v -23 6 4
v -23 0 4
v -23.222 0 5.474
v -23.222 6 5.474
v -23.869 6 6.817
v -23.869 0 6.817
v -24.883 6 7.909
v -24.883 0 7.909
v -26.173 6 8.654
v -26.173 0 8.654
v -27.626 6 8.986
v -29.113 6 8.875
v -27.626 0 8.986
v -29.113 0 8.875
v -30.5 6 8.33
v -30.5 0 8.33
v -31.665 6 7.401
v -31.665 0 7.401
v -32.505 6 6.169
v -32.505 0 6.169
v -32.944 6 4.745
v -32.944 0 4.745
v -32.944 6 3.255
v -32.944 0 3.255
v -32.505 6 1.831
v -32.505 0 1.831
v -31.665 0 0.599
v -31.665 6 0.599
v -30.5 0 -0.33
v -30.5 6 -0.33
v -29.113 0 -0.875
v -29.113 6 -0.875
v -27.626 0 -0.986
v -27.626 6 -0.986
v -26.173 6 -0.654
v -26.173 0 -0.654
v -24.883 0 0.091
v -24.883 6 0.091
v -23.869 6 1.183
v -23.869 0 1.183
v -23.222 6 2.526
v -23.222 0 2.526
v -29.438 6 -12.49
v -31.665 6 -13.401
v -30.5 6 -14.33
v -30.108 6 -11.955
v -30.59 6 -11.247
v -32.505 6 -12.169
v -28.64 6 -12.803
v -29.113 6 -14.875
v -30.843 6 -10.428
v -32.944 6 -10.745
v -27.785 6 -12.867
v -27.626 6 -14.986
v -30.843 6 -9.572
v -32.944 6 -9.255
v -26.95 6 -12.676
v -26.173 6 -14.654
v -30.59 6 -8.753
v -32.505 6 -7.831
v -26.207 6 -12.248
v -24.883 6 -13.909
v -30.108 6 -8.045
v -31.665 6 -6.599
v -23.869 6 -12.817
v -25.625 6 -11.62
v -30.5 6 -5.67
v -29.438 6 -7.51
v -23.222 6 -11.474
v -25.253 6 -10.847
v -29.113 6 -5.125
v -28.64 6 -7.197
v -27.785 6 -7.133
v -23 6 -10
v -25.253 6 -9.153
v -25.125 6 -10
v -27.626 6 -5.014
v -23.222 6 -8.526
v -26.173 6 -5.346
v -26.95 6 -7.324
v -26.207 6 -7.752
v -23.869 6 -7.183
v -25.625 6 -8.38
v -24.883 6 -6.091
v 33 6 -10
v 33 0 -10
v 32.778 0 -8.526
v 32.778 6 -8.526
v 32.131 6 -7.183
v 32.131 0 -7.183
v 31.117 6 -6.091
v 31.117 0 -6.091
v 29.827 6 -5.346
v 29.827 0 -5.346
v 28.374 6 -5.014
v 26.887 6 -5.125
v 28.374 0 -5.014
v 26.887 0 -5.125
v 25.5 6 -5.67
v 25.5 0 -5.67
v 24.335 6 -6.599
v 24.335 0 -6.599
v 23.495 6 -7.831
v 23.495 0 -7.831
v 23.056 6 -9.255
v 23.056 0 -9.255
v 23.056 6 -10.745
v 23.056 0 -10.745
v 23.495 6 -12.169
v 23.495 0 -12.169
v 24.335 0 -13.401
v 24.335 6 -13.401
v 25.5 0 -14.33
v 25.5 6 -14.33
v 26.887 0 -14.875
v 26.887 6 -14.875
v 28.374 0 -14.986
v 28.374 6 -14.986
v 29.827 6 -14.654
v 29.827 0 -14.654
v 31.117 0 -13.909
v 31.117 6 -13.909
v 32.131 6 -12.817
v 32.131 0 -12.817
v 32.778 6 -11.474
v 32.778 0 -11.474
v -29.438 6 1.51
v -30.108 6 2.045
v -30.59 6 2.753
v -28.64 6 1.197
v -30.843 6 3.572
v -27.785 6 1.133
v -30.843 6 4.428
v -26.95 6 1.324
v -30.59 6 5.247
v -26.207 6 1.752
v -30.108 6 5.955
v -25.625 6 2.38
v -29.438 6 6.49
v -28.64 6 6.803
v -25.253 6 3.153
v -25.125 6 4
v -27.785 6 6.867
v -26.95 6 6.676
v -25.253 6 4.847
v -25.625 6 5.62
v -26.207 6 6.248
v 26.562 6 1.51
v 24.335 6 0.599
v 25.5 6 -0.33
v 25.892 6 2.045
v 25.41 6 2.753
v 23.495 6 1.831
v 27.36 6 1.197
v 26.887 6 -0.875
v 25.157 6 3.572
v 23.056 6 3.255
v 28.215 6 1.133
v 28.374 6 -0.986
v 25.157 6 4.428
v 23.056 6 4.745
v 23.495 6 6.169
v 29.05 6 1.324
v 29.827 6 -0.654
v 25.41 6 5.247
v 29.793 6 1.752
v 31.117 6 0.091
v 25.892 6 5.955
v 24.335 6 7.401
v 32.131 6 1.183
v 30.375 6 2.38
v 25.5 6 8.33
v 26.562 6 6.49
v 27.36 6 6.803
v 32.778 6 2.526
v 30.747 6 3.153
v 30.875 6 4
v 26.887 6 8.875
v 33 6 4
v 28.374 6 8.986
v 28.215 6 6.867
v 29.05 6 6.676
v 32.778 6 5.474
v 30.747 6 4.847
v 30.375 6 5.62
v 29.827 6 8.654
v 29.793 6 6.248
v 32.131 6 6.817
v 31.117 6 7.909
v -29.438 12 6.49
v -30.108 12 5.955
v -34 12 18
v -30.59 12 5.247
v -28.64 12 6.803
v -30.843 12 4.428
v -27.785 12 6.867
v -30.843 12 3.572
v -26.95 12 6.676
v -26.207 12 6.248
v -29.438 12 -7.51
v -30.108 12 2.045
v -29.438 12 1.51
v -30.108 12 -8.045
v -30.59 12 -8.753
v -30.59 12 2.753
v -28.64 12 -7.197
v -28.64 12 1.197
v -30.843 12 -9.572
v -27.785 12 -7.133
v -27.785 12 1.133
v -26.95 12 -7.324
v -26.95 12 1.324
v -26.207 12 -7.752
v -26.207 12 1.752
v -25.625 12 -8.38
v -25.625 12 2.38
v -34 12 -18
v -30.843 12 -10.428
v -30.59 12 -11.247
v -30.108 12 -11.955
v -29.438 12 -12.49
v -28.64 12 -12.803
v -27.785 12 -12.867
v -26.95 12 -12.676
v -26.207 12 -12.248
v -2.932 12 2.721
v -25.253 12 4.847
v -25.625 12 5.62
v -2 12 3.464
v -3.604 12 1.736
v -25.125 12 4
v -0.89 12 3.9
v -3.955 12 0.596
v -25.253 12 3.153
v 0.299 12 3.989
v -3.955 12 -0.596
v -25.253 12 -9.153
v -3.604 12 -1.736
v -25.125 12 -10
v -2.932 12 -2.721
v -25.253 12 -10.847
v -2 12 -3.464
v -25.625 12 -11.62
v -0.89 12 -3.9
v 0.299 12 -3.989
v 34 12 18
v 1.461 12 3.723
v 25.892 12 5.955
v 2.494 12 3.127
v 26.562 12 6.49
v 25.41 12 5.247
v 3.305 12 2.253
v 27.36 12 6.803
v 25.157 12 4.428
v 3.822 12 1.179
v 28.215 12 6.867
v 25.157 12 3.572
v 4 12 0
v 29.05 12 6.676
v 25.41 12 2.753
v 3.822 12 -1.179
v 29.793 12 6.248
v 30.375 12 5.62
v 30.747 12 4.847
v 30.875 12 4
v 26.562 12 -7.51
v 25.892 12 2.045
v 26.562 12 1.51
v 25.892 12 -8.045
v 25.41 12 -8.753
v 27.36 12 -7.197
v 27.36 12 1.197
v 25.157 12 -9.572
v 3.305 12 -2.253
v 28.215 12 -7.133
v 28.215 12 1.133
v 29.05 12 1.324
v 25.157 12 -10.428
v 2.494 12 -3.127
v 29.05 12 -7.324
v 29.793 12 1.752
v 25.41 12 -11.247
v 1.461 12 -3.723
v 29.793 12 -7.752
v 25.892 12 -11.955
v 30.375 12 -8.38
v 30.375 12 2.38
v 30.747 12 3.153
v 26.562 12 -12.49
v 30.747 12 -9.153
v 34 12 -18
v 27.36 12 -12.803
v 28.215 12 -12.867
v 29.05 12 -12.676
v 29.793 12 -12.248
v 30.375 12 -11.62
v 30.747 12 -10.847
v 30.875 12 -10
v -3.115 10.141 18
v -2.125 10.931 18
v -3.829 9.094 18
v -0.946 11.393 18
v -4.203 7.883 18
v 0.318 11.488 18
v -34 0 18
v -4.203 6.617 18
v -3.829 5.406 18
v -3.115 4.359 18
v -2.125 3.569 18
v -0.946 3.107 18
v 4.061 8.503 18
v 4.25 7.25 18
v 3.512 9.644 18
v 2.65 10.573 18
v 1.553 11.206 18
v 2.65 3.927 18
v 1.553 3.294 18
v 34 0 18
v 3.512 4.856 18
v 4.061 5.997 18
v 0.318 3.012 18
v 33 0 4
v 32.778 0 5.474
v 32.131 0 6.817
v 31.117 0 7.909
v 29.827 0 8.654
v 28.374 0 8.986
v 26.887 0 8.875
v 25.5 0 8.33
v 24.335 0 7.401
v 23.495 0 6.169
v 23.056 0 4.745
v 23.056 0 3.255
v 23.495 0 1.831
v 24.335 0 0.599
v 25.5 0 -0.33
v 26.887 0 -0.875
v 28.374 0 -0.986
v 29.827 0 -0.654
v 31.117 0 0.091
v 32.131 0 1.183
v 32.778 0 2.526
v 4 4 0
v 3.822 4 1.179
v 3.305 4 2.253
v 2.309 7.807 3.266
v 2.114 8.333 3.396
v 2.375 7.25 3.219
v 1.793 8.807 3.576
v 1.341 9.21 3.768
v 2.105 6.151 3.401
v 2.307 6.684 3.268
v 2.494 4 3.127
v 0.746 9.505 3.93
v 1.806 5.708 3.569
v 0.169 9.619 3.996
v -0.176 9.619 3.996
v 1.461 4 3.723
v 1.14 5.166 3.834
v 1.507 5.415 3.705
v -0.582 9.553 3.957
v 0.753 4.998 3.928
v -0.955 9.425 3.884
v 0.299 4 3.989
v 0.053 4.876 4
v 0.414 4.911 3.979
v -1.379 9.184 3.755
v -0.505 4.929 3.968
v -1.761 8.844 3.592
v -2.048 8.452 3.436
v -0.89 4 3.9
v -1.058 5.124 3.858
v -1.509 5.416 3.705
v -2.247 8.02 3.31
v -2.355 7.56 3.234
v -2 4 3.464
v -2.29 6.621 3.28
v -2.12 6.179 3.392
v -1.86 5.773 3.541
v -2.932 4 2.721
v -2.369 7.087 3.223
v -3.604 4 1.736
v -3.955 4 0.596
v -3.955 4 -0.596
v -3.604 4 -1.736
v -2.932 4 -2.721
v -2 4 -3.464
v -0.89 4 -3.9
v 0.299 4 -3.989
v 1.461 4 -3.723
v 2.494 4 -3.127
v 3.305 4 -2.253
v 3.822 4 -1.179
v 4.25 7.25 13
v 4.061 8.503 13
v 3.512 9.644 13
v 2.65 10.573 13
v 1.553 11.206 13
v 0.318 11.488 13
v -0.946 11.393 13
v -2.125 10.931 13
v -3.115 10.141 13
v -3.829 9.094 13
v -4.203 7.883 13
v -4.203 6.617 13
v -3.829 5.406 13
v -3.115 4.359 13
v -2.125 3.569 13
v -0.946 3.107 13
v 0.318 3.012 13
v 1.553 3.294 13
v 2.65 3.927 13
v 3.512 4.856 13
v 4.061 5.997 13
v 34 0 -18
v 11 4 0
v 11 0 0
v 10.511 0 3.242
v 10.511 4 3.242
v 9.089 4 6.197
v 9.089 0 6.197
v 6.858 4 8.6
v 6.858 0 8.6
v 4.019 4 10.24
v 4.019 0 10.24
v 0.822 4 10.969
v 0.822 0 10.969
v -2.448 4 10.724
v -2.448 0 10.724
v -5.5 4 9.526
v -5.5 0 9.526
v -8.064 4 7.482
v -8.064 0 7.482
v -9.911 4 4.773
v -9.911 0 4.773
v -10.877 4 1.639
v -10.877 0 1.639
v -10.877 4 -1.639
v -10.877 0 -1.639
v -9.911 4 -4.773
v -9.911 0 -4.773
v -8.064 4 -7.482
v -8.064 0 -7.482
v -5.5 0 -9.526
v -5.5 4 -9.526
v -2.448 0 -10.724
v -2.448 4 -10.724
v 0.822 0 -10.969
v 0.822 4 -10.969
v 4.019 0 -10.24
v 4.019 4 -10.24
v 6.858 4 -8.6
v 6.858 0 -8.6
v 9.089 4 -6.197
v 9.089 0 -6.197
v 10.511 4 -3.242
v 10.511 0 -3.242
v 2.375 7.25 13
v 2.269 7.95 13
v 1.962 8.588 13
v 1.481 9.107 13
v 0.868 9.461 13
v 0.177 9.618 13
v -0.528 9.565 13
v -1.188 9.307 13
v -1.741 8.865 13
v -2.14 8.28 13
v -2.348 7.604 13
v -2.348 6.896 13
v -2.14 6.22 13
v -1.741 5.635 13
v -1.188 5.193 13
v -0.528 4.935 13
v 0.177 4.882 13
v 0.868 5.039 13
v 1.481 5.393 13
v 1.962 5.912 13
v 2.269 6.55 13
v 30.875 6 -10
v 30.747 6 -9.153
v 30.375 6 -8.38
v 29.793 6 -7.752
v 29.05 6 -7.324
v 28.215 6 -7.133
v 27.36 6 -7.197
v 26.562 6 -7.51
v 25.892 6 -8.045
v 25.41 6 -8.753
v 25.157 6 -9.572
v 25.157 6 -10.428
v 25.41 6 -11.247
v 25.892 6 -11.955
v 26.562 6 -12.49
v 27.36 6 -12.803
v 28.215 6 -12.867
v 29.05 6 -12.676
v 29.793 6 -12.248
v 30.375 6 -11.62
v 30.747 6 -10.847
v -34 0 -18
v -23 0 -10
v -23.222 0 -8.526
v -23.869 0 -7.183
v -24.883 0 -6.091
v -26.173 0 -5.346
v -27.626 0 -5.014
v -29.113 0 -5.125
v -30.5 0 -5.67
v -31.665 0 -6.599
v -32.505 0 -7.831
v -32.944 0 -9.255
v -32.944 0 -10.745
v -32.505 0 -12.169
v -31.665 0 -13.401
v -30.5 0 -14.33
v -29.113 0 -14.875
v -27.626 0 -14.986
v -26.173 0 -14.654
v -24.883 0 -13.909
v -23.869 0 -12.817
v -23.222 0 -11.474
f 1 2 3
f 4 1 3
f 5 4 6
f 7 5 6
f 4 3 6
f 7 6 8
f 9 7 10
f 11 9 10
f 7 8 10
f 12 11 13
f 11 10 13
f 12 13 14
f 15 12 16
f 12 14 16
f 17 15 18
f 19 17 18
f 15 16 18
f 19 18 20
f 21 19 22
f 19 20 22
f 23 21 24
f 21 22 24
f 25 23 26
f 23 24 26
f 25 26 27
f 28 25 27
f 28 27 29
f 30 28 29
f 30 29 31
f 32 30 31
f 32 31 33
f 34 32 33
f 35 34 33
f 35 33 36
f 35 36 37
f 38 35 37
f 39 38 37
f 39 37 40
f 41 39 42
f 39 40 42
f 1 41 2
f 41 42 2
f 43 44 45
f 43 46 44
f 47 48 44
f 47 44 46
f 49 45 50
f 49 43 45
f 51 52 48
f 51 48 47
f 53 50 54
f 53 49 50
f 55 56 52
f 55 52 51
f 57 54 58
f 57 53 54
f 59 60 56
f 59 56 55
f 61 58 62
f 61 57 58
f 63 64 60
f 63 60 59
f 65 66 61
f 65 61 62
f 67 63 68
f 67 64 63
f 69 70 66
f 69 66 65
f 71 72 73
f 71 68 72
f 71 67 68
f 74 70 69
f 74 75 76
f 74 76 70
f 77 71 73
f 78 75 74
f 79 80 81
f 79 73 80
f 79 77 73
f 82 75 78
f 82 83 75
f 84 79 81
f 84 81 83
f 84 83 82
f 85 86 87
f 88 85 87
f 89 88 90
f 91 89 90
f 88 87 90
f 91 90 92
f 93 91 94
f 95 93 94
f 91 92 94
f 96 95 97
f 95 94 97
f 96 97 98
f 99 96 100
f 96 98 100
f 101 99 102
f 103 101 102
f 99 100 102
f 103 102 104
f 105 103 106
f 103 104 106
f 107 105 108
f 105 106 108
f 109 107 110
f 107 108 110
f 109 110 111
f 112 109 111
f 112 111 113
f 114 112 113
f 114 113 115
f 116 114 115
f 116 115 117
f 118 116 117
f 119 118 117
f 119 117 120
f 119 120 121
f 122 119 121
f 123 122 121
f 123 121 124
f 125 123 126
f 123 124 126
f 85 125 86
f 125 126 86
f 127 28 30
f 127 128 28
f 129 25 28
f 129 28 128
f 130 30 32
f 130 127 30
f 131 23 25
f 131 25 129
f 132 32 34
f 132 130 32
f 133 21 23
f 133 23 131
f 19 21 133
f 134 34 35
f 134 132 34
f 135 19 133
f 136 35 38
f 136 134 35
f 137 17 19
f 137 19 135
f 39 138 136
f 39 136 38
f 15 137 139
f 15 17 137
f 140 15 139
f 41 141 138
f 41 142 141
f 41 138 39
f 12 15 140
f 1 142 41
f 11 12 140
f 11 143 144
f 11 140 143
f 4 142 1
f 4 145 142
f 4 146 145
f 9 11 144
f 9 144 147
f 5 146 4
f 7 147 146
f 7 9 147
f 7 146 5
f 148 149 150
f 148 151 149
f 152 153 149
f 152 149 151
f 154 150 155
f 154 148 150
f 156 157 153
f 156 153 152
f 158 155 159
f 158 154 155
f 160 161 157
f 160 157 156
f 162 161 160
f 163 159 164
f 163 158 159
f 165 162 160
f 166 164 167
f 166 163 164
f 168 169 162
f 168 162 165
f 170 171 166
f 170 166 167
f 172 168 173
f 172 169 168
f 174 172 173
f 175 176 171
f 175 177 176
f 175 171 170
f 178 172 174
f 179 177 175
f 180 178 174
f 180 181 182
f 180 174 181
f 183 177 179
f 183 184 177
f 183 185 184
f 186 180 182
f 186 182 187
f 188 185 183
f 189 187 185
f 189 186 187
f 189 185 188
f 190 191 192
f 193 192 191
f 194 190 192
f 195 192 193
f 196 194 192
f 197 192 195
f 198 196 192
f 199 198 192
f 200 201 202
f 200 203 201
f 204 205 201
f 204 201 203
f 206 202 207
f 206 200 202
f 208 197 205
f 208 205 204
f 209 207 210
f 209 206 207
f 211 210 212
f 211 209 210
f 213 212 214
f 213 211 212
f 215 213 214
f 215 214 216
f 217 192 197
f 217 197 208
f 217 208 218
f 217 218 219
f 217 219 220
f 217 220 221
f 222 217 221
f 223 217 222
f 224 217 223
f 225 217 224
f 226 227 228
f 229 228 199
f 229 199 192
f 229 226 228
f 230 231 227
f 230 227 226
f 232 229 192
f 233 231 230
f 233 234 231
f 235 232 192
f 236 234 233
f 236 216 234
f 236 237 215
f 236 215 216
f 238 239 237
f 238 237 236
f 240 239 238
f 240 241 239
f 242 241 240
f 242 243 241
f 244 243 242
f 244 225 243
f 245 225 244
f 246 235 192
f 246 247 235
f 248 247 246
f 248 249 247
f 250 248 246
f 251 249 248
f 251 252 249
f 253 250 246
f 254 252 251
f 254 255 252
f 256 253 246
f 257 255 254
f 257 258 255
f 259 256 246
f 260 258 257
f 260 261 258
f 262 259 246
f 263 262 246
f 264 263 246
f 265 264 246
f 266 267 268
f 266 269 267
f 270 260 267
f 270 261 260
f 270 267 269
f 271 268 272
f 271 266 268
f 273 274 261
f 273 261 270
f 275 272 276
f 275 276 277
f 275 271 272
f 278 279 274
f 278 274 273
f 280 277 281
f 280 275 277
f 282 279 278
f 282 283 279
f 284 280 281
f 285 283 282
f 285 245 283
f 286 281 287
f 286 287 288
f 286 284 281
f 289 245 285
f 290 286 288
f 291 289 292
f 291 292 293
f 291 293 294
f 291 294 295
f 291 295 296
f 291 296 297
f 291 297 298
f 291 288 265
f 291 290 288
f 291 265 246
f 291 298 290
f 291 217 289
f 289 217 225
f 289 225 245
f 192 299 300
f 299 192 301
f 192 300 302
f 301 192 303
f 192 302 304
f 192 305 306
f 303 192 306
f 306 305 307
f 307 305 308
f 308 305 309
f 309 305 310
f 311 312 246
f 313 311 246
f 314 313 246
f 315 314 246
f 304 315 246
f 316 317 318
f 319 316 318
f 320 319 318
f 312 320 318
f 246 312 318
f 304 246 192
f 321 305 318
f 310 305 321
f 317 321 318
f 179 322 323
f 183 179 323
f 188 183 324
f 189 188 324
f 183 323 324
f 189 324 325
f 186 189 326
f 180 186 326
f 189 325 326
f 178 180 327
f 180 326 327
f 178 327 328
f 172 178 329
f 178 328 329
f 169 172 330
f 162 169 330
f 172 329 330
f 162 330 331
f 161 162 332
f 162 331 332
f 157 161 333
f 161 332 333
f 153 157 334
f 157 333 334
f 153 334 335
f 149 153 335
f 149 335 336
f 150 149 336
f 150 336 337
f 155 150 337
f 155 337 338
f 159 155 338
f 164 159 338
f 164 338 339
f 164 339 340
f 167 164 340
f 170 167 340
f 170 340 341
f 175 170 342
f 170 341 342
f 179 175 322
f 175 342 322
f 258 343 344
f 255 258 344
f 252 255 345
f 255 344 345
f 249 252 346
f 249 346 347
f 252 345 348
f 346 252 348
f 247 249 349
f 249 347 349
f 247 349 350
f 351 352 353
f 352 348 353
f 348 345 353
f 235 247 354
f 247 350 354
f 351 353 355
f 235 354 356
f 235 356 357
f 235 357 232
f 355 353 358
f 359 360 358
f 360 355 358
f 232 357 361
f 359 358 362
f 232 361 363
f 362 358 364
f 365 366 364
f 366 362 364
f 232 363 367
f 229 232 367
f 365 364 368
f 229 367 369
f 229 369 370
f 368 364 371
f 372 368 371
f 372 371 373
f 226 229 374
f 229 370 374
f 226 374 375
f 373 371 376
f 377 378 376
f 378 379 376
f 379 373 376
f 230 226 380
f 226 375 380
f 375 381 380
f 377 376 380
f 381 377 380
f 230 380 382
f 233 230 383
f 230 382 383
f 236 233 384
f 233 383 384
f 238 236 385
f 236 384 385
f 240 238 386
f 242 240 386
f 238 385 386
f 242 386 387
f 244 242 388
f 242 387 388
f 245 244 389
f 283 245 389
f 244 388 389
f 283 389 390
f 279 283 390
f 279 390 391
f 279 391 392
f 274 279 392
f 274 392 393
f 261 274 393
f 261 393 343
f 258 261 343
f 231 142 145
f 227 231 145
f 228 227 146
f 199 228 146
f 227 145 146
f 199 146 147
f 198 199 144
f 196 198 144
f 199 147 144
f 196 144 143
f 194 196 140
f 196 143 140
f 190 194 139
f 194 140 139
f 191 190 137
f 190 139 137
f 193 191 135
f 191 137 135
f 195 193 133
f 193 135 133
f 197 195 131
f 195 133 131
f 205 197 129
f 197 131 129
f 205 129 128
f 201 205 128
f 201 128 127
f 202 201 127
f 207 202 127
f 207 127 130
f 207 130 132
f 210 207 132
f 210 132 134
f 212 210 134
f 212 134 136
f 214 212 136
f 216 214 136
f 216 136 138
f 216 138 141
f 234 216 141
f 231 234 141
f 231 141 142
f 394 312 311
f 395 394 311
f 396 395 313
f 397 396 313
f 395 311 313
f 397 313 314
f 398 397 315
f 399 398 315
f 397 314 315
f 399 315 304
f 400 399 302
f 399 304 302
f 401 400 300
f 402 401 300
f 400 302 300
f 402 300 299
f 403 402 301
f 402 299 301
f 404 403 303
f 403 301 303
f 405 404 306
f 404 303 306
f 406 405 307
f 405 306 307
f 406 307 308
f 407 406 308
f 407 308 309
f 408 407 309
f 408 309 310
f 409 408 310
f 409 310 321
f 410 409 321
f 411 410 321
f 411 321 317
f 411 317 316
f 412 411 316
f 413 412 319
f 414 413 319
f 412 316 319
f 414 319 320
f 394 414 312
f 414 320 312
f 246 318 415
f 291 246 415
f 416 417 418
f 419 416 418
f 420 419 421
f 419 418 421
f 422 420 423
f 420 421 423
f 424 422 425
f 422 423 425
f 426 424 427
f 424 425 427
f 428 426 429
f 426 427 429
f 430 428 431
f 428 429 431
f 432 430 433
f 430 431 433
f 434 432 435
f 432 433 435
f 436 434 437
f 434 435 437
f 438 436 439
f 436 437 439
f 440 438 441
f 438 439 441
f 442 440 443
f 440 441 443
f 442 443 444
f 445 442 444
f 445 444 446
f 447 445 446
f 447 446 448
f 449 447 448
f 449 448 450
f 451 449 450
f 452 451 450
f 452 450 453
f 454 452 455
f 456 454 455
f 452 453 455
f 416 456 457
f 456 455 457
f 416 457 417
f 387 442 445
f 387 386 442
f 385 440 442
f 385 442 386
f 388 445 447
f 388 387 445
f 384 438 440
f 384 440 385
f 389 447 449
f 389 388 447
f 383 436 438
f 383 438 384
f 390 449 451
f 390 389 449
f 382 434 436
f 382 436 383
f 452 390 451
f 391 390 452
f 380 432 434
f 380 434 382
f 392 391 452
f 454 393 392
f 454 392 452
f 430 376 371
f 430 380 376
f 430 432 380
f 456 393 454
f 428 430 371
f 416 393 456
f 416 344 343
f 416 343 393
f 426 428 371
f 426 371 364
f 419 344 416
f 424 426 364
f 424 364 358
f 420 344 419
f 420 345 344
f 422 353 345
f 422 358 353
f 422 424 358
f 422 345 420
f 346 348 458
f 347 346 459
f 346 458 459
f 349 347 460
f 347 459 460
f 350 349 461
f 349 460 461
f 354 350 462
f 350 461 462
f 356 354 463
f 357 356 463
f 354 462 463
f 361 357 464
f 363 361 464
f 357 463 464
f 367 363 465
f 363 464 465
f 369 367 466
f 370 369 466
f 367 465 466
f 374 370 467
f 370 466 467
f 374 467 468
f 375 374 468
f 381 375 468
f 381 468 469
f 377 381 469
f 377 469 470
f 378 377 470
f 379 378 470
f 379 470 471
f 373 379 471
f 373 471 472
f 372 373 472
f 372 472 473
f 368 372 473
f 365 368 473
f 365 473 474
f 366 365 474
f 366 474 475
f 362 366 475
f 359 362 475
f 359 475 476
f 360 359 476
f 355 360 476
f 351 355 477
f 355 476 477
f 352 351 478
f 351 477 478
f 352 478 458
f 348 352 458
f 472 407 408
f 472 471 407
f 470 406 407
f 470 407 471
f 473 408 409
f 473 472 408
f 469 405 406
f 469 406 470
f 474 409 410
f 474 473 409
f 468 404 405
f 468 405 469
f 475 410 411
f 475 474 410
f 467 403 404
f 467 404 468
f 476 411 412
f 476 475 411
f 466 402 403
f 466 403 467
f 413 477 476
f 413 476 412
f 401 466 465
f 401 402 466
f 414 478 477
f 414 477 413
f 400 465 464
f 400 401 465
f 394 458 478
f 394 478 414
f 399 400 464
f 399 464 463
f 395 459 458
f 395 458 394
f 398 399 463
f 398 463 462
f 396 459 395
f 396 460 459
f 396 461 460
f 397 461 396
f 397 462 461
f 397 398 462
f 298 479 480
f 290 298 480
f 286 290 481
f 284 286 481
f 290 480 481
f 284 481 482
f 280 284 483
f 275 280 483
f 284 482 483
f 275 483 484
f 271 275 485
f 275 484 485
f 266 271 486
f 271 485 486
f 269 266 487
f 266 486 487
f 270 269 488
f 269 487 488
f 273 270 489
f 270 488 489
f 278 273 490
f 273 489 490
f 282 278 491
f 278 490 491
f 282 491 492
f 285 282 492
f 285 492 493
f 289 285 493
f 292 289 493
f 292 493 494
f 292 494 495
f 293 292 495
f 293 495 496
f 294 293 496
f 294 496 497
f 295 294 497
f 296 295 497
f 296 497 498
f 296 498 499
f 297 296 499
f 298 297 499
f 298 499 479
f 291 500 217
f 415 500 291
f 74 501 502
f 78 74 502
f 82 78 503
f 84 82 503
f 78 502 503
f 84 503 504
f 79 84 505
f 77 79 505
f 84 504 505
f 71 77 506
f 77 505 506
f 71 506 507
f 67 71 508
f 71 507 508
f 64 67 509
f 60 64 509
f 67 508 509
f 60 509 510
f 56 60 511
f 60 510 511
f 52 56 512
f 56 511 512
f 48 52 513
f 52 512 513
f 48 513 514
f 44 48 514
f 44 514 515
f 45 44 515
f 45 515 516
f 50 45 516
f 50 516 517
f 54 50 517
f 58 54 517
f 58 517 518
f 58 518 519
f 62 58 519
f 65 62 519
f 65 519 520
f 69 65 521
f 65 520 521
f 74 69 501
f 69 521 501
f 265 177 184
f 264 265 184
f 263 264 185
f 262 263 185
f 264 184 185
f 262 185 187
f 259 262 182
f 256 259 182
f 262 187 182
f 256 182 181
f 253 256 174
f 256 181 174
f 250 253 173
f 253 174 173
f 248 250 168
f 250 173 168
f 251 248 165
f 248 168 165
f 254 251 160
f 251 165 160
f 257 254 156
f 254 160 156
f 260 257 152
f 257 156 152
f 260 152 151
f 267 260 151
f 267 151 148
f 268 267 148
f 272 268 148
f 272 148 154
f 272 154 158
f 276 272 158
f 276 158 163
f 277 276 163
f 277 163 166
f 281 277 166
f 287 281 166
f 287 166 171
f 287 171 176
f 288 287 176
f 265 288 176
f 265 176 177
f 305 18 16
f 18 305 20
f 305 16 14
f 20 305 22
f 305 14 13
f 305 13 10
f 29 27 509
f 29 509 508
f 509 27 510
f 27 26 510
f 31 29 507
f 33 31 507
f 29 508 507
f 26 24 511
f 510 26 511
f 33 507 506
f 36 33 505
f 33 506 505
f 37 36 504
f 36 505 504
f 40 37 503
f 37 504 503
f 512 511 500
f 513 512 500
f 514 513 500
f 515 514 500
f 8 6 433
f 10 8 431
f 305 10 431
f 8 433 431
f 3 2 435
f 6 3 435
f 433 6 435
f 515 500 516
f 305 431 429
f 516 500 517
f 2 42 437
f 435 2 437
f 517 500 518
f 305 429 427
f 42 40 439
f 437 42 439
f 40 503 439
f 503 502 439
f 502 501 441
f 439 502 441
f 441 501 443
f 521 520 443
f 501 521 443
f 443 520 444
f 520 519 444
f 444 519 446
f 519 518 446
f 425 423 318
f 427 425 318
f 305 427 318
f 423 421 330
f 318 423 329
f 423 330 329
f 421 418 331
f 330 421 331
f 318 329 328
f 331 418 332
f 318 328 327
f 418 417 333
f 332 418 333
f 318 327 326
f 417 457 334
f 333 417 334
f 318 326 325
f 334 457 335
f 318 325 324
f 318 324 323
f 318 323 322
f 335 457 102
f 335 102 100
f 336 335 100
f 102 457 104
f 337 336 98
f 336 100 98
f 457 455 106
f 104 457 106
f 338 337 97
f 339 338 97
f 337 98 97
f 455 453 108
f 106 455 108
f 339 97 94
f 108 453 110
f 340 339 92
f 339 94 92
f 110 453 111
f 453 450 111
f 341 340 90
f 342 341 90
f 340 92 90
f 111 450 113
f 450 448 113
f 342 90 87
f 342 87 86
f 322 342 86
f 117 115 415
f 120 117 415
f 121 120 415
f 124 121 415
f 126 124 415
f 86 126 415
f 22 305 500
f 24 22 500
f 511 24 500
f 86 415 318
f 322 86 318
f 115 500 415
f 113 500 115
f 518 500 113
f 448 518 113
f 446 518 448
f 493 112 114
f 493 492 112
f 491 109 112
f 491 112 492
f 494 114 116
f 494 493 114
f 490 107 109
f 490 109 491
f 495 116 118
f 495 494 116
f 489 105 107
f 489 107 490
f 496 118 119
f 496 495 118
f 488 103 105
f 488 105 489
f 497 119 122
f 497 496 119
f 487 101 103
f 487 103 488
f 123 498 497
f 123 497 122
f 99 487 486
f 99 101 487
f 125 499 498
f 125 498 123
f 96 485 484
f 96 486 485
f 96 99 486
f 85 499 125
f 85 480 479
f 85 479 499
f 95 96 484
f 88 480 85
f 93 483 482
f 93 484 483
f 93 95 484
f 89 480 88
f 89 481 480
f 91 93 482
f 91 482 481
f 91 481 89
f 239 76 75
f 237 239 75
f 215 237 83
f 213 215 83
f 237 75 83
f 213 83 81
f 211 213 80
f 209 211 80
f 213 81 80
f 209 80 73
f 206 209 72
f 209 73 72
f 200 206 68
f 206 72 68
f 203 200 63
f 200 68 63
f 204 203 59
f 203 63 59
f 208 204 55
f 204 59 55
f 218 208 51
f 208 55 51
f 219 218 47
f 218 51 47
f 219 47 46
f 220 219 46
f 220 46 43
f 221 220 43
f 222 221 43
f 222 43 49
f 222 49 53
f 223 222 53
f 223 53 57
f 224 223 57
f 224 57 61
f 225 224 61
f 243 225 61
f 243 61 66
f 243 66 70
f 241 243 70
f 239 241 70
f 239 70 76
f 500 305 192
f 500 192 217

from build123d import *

# Parameters (mm, degrees)
SKETCH1_W           = 68
SKETCH1_H           = 36
BOSS_EXTRUDE1_DEPTH = 12
SKETCH2_R           = 11
CUT_EXTRUDE1_DEPTH  = 4
SKETCH3_R           = 4
CUT_EXTRUDE2_DEPTH  = 9
CUT_EXTRUDE3_REACH  = 38
SKETCH4_R           = 2.375
CUT_EXTRUDE4_REACH  = 14
SKETCH5_R           = 2.875
SKETCH6_R           = 5
CUT_EXTRUDE5_DEPTH  = 6
SKETCH7_R           = 4.25
CUT_EXTRUDE6_DEPTH  = 5


with BuildPart() as part:
    # Sketch1 → Boss-Extrude1 (new body)
    with BuildSketch(Plane(origin=(0, 0, 0), x_dir=(1, 0, 0), z_dir=(0, 1, 0))):
        Rectangle(SKETCH1_W, SKETCH1_H)
    extrude(amount=BOSS_EXTRUDE1_DEPTH)

    # Sketch2 → Cut-Extrude1 (cut)
    with BuildSketch(Plane.XZ):
        Circle(SKETCH2_R)
    extrude(amount=-CUT_EXTRUDE1_DEPTH, mode=Mode.SUBTRACT)

    # Sketch3 → Cut-Extrude2 (cut, through all)
    with BuildSketch(Plane.XZ.offset(-4)):
        Circle(SKETCH3_R)
    extrude(amount=-CUT_EXTRUDE2_DEPTH, mode=Mode.SUBTRACT)

    # Sketch4 → Cut-Extrude3 (cut, up to next)
    with BuildSketch(Plane.XY.offset(18), mode=Mode.PRIVATE) as cut_extrude3_sk1:
        with Locations((0, 7.25)):
            Circle(SKETCH4_R)
    cut_extrude3_tool1 = extrude(cut_extrude3_sk1.sketch, amount=-CUT_EXTRUDE3_REACH, mode=Mode.PRIVATE) & part.part
    add(cut_extrude3_tool1.solids().sort_by_distance((0, 7.25, 18))[0], mode=Mode.SUBTRACT)

    # Sketch5 → Cut-Extrude4 (cut, up to next)
    with BuildSketch(Plane.XZ, mode=Mode.PRIVATE) as cut_extrude4_sk1:
        with Locations((28, 4)):
            Circle(SKETCH5_R)
    cut_extrude4_tool1 = extrude(cut_extrude4_sk1.sketch, amount=-CUT_EXTRUDE4_REACH, mode=Mode.PRIVATE) & part.part
    add(cut_extrude4_tool1.solids().sort_by_distance((28, 0, 4))[0], mode=Mode.SUBTRACT)
    # Sketch5 → Cut-Extrude4 (cut, up to next)
    with BuildSketch(Plane.XZ, mode=Mode.PRIVATE) as cut_extrude4_sk2:
        with Locations((28, -10)):
            Circle(SKETCH5_R)
    cut_extrude4_tool2 = extrude(cut_extrude4_sk2.sketch, amount=-CUT_EXTRUDE4_REACH, mode=Mode.PRIVATE) & part.part
    add(cut_extrude4_tool2.solids().sort_by_distance((28, 0, -10))[0], mode=Mode.SUBTRACT)
    # Sketch5 → Cut-Extrude4 (cut, up to next)
    with BuildSketch(Plane.XZ, mode=Mode.PRIVATE) as cut_extrude4_sk3:
        with Locations((-28, 4)):
            Circle(SKETCH5_R)
    cut_extrude4_tool3 = extrude(cut_extrude4_sk3.sketch, amount=-CUT_EXTRUDE4_REACH, mode=Mode.PRIVATE) & part.part
    add(cut_extrude4_tool3.solids().sort_by_distance((-28, 0, 4))[0], mode=Mode.SUBTRACT)
    # Sketch5 → Cut-Extrude4 (cut, up to next)
    with BuildSketch(Plane.XZ, mode=Mode.PRIVATE) as cut_extrude4_sk4:
        with Locations((-28, -10)):
            Circle(SKETCH5_R)
    cut_extrude4_tool4 = extrude(cut_extrude4_sk4.sketch, amount=-CUT_EXTRUDE4_REACH, mode=Mode.PRIVATE) & part.part
    add(cut_extrude4_tool4.solids().sort_by_distance((-28, 0, -10))[0], mode=Mode.SUBTRACT)

    # Sketch6 → Cut-Extrude5 (cut)
    with BuildSketch(Plane.XZ):
        with Locations((-28, 4)):
            Circle(SKETCH6_R)
        with Locations((28, 4)):
            Circle(SKETCH6_R)
        with Locations((28, -10)):
            Circle(SKETCH6_R)
        with Locations((-28, -10)):
            Circle(SKETCH6_R)
    extrude(amount=-CUT_EXTRUDE5_DEPTH, mode=Mode.SUBTRACT)

    # Sketch7 → Cut-Extrude6 (cut)
    with BuildSketch(Plane.XY.offset(18)):
        with Locations((0, 7.25)):
            Circle(SKETCH7_R)
    extrude(amount=-CUT_EXTRUDE6_DEPTH, mode=Mode.SUBTRACT)


solid = part.part
